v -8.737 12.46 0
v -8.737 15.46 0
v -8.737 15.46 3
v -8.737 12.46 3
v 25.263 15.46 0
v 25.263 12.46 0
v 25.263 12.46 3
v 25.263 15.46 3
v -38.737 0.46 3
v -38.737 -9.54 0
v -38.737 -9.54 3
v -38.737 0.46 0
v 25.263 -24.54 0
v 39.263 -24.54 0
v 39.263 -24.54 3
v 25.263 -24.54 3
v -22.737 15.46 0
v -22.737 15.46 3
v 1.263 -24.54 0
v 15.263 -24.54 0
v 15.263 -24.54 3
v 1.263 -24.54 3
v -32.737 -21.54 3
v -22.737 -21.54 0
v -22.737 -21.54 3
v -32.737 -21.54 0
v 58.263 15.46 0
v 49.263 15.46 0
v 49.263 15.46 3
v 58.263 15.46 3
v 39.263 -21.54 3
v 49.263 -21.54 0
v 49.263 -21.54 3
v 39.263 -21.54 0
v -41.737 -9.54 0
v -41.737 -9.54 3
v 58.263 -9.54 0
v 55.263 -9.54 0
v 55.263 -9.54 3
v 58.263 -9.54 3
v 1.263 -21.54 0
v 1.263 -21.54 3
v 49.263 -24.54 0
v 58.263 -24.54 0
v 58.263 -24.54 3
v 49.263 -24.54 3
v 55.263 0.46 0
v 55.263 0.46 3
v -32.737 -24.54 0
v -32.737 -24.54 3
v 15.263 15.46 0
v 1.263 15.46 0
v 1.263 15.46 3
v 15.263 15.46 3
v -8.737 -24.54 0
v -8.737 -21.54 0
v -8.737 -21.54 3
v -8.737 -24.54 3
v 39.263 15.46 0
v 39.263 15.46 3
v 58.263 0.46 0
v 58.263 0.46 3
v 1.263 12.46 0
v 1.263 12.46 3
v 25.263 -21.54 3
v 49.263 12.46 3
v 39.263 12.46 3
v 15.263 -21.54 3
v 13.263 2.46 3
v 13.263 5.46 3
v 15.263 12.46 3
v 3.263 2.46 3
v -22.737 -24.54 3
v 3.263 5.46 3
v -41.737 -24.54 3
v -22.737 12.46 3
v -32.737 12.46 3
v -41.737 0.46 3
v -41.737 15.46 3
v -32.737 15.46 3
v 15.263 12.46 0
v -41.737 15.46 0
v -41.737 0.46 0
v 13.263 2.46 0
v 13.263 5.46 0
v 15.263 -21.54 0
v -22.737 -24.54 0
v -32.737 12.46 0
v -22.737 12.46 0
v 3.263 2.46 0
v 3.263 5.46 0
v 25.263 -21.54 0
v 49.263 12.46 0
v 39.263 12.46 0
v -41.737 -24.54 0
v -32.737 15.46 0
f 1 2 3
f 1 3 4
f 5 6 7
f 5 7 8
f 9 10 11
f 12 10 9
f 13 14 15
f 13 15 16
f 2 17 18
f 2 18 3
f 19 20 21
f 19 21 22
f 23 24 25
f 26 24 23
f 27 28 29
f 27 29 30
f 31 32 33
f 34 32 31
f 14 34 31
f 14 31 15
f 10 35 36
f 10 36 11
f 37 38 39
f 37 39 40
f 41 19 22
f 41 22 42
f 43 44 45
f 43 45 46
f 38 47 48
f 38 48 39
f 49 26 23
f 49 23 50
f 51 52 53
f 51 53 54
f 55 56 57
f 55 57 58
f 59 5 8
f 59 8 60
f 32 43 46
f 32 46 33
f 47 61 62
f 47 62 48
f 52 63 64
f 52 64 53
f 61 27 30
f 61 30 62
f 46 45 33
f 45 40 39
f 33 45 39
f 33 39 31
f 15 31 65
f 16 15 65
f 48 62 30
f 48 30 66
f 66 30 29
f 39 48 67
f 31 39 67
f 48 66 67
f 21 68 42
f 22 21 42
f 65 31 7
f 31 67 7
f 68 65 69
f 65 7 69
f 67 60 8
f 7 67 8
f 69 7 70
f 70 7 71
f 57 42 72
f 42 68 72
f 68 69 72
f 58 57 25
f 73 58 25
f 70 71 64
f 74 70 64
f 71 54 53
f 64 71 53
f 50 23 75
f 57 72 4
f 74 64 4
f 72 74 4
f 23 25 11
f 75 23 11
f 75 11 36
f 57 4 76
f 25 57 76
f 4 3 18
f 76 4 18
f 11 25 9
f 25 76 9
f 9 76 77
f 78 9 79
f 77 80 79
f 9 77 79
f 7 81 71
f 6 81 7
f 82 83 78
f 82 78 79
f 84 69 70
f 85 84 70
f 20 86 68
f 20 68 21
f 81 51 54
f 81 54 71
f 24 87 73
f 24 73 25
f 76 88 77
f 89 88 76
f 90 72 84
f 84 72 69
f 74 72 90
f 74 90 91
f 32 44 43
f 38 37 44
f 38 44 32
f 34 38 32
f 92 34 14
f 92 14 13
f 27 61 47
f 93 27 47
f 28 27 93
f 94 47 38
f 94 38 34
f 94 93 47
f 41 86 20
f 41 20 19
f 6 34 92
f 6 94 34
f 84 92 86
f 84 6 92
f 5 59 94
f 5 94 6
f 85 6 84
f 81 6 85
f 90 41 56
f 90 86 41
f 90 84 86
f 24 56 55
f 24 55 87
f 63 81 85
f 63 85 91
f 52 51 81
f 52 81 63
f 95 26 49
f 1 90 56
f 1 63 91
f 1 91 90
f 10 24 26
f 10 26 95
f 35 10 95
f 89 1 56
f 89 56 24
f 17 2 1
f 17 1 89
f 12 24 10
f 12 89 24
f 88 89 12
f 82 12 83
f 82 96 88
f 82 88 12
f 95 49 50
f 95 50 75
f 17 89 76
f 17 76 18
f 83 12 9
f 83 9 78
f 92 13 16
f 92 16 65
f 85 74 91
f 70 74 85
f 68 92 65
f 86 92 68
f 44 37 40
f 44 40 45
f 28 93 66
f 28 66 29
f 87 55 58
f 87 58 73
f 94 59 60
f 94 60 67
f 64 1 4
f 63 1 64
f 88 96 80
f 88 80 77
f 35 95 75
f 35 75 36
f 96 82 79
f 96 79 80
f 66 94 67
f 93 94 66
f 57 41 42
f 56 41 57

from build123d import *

# Parameters (mm, degrees)
EXTRUDE_1_DEPTH     = 3
SKETCH_2_W          = 10
SKETCH_2_H          = 3
CUT_EXTRUDE_1_DEPTH = 3


with BuildPart() as part:
    # 草圖1 → 填料-伸長1 (new body)
    with BuildSketch(Plane.XY):
        Polygon((49.262888429, -24.540240663), (49.262888429, -21.540240663), (39.262888429, -21.540240663), (39.262888429, -24.540240663), (25.262888429, -24.540240663), (25.262888429, -21.540240663), (15.262888429, -21.540240663), (15.262888429, -24.540240663), (1.262888429, -24.540240663), (1.262888429, -21.540240663), (-8.737111571, -21.540240663), (-8.737111571, -24.540240663), (-22.737111571, -24.540240663), (-22.737111571, -21.540240663), (-32.737111571, -21.540240663), (-32.737111571, -24.540240663), (-41.737111571, -24.540240663), (-41.737111571, -9.540240663), (-38.737111571, -9.540240663), (-38.737111571, 0.459759337), (-41.737111571, 0.459759337), (-41.737111571, 15.459759337), (-32.737111571, 15.459759337), (-32.737111571, 12.459759337), (-22.737111571, 12.459759337), (-22.737111571, 15.459759337), (-8.737111571, 15.459759337), (-8.737111571, 12.459759337), (1.262888429, 12.459759337), (1.262888429, 15.459759337), (15.262888429, 15.459759337), (15.262888429, 12.459759337), (25.262888429, 12.459759337), (25.262888429, 15.459759337), (39.262888429, 15.459759337), (39.262888429, 12.459759337), (49.262888429, 12.459759337), (49.262888429, 15.459759337), (58.262888429, 15.459759337), (58.262888429, 0.459759337), (55.262888429, 0.459759337), (55.262888429, -9.540240663), (58.262888429, -9.540240663), (58.262888429, -24.540240663), align=None)
    extrude(amount=EXTRUDE_1_DEPTH)

    # 草圖2 → 除料-伸長1 (cut)
    with BuildSketch(Plane.XY.offset(3)):
        with Locations((8.262888429, 3.959759337)):
            Rectangle(SKETCH_2_W, SKETCH_2_H)
    extrude(amount=-CUT_EXTRUDE_1_DEPTH, mode=Mode.SUBTRACT)


solid = part.part
